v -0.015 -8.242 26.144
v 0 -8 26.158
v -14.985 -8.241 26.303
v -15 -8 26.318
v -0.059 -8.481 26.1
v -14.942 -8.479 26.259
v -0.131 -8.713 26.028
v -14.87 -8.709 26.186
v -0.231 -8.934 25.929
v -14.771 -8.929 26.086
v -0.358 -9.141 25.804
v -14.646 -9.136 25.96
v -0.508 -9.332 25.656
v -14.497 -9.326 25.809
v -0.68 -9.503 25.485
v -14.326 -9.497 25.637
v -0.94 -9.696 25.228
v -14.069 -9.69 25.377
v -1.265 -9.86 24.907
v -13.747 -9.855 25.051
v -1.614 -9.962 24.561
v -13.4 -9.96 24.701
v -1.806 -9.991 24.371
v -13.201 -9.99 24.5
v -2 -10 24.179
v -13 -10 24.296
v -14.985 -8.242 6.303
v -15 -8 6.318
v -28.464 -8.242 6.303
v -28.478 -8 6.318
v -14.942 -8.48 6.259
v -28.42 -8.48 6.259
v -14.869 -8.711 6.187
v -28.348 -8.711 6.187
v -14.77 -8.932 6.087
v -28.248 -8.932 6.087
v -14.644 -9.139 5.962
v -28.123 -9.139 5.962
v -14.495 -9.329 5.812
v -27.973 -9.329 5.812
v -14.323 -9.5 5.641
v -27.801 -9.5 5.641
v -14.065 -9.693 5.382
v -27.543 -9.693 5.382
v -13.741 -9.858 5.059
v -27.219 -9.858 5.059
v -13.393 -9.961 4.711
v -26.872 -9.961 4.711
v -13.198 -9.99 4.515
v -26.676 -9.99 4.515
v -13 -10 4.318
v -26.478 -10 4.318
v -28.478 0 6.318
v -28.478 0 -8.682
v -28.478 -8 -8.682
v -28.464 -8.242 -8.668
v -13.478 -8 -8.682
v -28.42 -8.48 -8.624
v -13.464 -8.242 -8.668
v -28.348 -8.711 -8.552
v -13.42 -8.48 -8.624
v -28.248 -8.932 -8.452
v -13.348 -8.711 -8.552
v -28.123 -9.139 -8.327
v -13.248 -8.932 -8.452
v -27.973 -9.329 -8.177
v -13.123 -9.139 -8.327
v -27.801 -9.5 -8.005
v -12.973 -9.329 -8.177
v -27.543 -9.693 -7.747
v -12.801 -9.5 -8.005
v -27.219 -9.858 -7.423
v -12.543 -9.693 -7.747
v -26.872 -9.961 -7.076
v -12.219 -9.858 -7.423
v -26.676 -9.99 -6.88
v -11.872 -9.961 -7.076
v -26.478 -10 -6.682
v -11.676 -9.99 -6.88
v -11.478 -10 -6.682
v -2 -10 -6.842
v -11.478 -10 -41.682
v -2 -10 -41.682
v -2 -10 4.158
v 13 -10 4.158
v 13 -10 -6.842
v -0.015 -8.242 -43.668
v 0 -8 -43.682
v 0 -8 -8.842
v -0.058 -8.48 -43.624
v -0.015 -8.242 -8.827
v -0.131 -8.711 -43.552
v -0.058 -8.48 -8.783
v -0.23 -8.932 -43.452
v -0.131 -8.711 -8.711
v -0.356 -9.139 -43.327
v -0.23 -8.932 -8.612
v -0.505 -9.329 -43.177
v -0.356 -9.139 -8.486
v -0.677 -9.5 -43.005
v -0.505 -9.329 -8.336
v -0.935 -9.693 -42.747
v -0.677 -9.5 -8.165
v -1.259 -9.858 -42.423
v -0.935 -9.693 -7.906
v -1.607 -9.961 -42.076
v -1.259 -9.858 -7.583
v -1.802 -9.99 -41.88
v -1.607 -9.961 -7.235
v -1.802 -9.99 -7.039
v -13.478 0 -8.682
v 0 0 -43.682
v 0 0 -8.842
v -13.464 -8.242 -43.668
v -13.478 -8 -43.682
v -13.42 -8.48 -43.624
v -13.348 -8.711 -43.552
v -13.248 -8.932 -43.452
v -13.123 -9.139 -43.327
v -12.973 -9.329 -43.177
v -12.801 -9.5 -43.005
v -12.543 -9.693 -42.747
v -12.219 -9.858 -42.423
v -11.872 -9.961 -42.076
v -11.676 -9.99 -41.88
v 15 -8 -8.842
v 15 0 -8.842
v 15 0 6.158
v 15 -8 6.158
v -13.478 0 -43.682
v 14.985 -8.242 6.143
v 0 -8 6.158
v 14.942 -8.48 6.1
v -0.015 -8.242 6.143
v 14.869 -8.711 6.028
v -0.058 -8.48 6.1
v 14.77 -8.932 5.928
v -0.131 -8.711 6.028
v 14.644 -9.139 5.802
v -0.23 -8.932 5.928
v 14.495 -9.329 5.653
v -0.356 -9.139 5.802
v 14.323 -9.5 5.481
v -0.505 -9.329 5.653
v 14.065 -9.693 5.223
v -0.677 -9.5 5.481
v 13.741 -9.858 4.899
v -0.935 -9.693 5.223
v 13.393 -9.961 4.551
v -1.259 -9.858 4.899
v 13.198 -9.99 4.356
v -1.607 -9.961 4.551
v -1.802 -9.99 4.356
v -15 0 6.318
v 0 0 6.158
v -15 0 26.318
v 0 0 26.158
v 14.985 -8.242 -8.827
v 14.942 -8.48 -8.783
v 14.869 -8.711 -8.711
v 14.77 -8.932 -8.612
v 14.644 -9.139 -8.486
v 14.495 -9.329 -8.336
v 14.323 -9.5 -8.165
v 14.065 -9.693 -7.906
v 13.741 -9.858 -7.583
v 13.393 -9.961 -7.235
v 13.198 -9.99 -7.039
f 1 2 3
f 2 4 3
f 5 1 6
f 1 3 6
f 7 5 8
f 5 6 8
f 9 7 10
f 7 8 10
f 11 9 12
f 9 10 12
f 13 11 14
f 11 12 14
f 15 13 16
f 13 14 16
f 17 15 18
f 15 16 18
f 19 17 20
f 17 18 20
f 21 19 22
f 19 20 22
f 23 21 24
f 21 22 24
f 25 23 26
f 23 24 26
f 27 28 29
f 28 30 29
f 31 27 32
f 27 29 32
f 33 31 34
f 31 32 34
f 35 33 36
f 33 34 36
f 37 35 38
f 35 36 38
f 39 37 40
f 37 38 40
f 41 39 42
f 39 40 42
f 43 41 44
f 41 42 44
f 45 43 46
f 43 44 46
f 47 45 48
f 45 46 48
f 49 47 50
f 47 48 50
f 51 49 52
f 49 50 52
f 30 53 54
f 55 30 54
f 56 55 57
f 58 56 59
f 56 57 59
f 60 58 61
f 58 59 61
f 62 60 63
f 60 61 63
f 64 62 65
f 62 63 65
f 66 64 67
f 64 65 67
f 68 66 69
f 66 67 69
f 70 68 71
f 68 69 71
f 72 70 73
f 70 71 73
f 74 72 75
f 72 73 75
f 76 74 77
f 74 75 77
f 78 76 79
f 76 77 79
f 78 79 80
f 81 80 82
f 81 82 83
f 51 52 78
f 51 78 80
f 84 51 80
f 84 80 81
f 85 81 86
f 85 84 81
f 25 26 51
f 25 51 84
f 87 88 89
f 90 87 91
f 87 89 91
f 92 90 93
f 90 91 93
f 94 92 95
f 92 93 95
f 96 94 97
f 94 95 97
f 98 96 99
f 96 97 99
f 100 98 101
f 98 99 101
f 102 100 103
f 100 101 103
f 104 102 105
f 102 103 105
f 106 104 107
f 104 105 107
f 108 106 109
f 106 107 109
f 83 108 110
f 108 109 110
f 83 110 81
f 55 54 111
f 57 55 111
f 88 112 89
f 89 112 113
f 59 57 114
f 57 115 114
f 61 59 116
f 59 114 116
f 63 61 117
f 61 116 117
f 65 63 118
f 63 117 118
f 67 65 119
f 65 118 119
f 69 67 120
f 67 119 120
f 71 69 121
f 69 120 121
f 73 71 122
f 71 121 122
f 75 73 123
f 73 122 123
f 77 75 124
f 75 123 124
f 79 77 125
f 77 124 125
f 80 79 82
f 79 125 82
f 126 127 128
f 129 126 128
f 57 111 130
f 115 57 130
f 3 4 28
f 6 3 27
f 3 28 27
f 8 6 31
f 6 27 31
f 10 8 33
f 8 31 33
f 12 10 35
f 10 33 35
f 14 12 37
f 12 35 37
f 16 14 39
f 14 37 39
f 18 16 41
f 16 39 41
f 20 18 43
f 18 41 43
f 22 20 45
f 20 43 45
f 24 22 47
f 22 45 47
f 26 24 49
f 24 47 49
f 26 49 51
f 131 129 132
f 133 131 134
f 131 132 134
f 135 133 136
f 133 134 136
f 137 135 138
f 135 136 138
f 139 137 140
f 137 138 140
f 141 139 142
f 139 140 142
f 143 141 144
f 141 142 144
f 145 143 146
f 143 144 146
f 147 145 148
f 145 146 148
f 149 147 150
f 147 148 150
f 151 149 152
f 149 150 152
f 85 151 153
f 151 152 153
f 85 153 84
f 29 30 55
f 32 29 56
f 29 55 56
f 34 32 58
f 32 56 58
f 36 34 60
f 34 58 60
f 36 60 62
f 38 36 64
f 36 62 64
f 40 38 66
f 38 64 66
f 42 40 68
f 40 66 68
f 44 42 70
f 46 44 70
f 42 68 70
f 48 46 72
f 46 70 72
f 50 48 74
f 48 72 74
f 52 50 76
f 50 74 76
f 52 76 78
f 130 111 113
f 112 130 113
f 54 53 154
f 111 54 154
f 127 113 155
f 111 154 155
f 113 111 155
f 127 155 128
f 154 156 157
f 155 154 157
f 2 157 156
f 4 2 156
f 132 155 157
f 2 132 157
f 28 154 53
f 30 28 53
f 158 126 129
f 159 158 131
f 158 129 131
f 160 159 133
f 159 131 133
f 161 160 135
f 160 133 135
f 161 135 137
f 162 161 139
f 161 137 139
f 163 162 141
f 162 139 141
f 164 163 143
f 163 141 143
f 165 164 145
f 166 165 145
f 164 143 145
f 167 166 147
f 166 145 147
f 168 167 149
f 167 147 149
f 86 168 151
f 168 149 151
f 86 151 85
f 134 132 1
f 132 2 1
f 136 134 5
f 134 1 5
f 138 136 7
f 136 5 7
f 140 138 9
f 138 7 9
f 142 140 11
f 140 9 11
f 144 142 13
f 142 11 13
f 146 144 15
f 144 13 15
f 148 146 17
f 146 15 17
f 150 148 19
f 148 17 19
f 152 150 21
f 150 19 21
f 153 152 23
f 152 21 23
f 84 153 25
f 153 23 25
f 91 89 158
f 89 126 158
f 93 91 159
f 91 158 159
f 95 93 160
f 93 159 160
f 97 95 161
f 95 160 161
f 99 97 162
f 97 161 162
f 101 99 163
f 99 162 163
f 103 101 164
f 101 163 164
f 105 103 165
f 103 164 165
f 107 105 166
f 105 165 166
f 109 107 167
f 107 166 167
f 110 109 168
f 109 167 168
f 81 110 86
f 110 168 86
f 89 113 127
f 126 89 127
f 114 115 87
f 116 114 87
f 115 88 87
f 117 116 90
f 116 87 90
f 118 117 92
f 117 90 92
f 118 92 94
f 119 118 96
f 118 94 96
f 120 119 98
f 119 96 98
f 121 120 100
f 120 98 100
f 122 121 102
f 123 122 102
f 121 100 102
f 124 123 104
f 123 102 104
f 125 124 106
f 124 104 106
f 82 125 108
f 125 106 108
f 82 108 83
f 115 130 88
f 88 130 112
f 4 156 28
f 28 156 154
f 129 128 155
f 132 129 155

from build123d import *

# Parameters (mm, degrees)
F1_DEPTH = 10
F2_R     = 2


with BuildPart() as f1:
    # F0 (on Front) → F1 (new body)
    with BuildSketch(Plane.XZ):
        Polygon((0, 26.158135), (-15, 26.317666), (-15, 6.317666), (-28.478333, 6.317666), (-28.478333, -8.682334), (-13.478333, -8.682334), (-13.478333, -43.682334), (0, -43.682334), (0, -8.841865), (15, -8.841865), (15, 6.158135), (0, 6.158135), align=None)
    extrude(amount=F1_DEPTH)

    # F2
    f2_edges = [f1.edges().sort_by_distance(p)[0] for p in [
        (-7.5, -10, 26.237901),
        (-15, -10, 16.317666),
        (-21.739167, -10, 6.317666),
        (-28.478333, -10, -1.182334),
        (-20.978333, -10, -8.682334),
        (-13.478333, -10, -26.182334),
        (-6.739167, -10, -43.682334),
        (0, -10, -26.262099),
        (7.5, -10, -8.841865),
        (15, -10, -1.341865),
        (7.5, -10, 6.158135),
        (0, -10, 16.158135),
    ]]
    fillet(f2_edges, radius=F2_R)


solid = f1.part
